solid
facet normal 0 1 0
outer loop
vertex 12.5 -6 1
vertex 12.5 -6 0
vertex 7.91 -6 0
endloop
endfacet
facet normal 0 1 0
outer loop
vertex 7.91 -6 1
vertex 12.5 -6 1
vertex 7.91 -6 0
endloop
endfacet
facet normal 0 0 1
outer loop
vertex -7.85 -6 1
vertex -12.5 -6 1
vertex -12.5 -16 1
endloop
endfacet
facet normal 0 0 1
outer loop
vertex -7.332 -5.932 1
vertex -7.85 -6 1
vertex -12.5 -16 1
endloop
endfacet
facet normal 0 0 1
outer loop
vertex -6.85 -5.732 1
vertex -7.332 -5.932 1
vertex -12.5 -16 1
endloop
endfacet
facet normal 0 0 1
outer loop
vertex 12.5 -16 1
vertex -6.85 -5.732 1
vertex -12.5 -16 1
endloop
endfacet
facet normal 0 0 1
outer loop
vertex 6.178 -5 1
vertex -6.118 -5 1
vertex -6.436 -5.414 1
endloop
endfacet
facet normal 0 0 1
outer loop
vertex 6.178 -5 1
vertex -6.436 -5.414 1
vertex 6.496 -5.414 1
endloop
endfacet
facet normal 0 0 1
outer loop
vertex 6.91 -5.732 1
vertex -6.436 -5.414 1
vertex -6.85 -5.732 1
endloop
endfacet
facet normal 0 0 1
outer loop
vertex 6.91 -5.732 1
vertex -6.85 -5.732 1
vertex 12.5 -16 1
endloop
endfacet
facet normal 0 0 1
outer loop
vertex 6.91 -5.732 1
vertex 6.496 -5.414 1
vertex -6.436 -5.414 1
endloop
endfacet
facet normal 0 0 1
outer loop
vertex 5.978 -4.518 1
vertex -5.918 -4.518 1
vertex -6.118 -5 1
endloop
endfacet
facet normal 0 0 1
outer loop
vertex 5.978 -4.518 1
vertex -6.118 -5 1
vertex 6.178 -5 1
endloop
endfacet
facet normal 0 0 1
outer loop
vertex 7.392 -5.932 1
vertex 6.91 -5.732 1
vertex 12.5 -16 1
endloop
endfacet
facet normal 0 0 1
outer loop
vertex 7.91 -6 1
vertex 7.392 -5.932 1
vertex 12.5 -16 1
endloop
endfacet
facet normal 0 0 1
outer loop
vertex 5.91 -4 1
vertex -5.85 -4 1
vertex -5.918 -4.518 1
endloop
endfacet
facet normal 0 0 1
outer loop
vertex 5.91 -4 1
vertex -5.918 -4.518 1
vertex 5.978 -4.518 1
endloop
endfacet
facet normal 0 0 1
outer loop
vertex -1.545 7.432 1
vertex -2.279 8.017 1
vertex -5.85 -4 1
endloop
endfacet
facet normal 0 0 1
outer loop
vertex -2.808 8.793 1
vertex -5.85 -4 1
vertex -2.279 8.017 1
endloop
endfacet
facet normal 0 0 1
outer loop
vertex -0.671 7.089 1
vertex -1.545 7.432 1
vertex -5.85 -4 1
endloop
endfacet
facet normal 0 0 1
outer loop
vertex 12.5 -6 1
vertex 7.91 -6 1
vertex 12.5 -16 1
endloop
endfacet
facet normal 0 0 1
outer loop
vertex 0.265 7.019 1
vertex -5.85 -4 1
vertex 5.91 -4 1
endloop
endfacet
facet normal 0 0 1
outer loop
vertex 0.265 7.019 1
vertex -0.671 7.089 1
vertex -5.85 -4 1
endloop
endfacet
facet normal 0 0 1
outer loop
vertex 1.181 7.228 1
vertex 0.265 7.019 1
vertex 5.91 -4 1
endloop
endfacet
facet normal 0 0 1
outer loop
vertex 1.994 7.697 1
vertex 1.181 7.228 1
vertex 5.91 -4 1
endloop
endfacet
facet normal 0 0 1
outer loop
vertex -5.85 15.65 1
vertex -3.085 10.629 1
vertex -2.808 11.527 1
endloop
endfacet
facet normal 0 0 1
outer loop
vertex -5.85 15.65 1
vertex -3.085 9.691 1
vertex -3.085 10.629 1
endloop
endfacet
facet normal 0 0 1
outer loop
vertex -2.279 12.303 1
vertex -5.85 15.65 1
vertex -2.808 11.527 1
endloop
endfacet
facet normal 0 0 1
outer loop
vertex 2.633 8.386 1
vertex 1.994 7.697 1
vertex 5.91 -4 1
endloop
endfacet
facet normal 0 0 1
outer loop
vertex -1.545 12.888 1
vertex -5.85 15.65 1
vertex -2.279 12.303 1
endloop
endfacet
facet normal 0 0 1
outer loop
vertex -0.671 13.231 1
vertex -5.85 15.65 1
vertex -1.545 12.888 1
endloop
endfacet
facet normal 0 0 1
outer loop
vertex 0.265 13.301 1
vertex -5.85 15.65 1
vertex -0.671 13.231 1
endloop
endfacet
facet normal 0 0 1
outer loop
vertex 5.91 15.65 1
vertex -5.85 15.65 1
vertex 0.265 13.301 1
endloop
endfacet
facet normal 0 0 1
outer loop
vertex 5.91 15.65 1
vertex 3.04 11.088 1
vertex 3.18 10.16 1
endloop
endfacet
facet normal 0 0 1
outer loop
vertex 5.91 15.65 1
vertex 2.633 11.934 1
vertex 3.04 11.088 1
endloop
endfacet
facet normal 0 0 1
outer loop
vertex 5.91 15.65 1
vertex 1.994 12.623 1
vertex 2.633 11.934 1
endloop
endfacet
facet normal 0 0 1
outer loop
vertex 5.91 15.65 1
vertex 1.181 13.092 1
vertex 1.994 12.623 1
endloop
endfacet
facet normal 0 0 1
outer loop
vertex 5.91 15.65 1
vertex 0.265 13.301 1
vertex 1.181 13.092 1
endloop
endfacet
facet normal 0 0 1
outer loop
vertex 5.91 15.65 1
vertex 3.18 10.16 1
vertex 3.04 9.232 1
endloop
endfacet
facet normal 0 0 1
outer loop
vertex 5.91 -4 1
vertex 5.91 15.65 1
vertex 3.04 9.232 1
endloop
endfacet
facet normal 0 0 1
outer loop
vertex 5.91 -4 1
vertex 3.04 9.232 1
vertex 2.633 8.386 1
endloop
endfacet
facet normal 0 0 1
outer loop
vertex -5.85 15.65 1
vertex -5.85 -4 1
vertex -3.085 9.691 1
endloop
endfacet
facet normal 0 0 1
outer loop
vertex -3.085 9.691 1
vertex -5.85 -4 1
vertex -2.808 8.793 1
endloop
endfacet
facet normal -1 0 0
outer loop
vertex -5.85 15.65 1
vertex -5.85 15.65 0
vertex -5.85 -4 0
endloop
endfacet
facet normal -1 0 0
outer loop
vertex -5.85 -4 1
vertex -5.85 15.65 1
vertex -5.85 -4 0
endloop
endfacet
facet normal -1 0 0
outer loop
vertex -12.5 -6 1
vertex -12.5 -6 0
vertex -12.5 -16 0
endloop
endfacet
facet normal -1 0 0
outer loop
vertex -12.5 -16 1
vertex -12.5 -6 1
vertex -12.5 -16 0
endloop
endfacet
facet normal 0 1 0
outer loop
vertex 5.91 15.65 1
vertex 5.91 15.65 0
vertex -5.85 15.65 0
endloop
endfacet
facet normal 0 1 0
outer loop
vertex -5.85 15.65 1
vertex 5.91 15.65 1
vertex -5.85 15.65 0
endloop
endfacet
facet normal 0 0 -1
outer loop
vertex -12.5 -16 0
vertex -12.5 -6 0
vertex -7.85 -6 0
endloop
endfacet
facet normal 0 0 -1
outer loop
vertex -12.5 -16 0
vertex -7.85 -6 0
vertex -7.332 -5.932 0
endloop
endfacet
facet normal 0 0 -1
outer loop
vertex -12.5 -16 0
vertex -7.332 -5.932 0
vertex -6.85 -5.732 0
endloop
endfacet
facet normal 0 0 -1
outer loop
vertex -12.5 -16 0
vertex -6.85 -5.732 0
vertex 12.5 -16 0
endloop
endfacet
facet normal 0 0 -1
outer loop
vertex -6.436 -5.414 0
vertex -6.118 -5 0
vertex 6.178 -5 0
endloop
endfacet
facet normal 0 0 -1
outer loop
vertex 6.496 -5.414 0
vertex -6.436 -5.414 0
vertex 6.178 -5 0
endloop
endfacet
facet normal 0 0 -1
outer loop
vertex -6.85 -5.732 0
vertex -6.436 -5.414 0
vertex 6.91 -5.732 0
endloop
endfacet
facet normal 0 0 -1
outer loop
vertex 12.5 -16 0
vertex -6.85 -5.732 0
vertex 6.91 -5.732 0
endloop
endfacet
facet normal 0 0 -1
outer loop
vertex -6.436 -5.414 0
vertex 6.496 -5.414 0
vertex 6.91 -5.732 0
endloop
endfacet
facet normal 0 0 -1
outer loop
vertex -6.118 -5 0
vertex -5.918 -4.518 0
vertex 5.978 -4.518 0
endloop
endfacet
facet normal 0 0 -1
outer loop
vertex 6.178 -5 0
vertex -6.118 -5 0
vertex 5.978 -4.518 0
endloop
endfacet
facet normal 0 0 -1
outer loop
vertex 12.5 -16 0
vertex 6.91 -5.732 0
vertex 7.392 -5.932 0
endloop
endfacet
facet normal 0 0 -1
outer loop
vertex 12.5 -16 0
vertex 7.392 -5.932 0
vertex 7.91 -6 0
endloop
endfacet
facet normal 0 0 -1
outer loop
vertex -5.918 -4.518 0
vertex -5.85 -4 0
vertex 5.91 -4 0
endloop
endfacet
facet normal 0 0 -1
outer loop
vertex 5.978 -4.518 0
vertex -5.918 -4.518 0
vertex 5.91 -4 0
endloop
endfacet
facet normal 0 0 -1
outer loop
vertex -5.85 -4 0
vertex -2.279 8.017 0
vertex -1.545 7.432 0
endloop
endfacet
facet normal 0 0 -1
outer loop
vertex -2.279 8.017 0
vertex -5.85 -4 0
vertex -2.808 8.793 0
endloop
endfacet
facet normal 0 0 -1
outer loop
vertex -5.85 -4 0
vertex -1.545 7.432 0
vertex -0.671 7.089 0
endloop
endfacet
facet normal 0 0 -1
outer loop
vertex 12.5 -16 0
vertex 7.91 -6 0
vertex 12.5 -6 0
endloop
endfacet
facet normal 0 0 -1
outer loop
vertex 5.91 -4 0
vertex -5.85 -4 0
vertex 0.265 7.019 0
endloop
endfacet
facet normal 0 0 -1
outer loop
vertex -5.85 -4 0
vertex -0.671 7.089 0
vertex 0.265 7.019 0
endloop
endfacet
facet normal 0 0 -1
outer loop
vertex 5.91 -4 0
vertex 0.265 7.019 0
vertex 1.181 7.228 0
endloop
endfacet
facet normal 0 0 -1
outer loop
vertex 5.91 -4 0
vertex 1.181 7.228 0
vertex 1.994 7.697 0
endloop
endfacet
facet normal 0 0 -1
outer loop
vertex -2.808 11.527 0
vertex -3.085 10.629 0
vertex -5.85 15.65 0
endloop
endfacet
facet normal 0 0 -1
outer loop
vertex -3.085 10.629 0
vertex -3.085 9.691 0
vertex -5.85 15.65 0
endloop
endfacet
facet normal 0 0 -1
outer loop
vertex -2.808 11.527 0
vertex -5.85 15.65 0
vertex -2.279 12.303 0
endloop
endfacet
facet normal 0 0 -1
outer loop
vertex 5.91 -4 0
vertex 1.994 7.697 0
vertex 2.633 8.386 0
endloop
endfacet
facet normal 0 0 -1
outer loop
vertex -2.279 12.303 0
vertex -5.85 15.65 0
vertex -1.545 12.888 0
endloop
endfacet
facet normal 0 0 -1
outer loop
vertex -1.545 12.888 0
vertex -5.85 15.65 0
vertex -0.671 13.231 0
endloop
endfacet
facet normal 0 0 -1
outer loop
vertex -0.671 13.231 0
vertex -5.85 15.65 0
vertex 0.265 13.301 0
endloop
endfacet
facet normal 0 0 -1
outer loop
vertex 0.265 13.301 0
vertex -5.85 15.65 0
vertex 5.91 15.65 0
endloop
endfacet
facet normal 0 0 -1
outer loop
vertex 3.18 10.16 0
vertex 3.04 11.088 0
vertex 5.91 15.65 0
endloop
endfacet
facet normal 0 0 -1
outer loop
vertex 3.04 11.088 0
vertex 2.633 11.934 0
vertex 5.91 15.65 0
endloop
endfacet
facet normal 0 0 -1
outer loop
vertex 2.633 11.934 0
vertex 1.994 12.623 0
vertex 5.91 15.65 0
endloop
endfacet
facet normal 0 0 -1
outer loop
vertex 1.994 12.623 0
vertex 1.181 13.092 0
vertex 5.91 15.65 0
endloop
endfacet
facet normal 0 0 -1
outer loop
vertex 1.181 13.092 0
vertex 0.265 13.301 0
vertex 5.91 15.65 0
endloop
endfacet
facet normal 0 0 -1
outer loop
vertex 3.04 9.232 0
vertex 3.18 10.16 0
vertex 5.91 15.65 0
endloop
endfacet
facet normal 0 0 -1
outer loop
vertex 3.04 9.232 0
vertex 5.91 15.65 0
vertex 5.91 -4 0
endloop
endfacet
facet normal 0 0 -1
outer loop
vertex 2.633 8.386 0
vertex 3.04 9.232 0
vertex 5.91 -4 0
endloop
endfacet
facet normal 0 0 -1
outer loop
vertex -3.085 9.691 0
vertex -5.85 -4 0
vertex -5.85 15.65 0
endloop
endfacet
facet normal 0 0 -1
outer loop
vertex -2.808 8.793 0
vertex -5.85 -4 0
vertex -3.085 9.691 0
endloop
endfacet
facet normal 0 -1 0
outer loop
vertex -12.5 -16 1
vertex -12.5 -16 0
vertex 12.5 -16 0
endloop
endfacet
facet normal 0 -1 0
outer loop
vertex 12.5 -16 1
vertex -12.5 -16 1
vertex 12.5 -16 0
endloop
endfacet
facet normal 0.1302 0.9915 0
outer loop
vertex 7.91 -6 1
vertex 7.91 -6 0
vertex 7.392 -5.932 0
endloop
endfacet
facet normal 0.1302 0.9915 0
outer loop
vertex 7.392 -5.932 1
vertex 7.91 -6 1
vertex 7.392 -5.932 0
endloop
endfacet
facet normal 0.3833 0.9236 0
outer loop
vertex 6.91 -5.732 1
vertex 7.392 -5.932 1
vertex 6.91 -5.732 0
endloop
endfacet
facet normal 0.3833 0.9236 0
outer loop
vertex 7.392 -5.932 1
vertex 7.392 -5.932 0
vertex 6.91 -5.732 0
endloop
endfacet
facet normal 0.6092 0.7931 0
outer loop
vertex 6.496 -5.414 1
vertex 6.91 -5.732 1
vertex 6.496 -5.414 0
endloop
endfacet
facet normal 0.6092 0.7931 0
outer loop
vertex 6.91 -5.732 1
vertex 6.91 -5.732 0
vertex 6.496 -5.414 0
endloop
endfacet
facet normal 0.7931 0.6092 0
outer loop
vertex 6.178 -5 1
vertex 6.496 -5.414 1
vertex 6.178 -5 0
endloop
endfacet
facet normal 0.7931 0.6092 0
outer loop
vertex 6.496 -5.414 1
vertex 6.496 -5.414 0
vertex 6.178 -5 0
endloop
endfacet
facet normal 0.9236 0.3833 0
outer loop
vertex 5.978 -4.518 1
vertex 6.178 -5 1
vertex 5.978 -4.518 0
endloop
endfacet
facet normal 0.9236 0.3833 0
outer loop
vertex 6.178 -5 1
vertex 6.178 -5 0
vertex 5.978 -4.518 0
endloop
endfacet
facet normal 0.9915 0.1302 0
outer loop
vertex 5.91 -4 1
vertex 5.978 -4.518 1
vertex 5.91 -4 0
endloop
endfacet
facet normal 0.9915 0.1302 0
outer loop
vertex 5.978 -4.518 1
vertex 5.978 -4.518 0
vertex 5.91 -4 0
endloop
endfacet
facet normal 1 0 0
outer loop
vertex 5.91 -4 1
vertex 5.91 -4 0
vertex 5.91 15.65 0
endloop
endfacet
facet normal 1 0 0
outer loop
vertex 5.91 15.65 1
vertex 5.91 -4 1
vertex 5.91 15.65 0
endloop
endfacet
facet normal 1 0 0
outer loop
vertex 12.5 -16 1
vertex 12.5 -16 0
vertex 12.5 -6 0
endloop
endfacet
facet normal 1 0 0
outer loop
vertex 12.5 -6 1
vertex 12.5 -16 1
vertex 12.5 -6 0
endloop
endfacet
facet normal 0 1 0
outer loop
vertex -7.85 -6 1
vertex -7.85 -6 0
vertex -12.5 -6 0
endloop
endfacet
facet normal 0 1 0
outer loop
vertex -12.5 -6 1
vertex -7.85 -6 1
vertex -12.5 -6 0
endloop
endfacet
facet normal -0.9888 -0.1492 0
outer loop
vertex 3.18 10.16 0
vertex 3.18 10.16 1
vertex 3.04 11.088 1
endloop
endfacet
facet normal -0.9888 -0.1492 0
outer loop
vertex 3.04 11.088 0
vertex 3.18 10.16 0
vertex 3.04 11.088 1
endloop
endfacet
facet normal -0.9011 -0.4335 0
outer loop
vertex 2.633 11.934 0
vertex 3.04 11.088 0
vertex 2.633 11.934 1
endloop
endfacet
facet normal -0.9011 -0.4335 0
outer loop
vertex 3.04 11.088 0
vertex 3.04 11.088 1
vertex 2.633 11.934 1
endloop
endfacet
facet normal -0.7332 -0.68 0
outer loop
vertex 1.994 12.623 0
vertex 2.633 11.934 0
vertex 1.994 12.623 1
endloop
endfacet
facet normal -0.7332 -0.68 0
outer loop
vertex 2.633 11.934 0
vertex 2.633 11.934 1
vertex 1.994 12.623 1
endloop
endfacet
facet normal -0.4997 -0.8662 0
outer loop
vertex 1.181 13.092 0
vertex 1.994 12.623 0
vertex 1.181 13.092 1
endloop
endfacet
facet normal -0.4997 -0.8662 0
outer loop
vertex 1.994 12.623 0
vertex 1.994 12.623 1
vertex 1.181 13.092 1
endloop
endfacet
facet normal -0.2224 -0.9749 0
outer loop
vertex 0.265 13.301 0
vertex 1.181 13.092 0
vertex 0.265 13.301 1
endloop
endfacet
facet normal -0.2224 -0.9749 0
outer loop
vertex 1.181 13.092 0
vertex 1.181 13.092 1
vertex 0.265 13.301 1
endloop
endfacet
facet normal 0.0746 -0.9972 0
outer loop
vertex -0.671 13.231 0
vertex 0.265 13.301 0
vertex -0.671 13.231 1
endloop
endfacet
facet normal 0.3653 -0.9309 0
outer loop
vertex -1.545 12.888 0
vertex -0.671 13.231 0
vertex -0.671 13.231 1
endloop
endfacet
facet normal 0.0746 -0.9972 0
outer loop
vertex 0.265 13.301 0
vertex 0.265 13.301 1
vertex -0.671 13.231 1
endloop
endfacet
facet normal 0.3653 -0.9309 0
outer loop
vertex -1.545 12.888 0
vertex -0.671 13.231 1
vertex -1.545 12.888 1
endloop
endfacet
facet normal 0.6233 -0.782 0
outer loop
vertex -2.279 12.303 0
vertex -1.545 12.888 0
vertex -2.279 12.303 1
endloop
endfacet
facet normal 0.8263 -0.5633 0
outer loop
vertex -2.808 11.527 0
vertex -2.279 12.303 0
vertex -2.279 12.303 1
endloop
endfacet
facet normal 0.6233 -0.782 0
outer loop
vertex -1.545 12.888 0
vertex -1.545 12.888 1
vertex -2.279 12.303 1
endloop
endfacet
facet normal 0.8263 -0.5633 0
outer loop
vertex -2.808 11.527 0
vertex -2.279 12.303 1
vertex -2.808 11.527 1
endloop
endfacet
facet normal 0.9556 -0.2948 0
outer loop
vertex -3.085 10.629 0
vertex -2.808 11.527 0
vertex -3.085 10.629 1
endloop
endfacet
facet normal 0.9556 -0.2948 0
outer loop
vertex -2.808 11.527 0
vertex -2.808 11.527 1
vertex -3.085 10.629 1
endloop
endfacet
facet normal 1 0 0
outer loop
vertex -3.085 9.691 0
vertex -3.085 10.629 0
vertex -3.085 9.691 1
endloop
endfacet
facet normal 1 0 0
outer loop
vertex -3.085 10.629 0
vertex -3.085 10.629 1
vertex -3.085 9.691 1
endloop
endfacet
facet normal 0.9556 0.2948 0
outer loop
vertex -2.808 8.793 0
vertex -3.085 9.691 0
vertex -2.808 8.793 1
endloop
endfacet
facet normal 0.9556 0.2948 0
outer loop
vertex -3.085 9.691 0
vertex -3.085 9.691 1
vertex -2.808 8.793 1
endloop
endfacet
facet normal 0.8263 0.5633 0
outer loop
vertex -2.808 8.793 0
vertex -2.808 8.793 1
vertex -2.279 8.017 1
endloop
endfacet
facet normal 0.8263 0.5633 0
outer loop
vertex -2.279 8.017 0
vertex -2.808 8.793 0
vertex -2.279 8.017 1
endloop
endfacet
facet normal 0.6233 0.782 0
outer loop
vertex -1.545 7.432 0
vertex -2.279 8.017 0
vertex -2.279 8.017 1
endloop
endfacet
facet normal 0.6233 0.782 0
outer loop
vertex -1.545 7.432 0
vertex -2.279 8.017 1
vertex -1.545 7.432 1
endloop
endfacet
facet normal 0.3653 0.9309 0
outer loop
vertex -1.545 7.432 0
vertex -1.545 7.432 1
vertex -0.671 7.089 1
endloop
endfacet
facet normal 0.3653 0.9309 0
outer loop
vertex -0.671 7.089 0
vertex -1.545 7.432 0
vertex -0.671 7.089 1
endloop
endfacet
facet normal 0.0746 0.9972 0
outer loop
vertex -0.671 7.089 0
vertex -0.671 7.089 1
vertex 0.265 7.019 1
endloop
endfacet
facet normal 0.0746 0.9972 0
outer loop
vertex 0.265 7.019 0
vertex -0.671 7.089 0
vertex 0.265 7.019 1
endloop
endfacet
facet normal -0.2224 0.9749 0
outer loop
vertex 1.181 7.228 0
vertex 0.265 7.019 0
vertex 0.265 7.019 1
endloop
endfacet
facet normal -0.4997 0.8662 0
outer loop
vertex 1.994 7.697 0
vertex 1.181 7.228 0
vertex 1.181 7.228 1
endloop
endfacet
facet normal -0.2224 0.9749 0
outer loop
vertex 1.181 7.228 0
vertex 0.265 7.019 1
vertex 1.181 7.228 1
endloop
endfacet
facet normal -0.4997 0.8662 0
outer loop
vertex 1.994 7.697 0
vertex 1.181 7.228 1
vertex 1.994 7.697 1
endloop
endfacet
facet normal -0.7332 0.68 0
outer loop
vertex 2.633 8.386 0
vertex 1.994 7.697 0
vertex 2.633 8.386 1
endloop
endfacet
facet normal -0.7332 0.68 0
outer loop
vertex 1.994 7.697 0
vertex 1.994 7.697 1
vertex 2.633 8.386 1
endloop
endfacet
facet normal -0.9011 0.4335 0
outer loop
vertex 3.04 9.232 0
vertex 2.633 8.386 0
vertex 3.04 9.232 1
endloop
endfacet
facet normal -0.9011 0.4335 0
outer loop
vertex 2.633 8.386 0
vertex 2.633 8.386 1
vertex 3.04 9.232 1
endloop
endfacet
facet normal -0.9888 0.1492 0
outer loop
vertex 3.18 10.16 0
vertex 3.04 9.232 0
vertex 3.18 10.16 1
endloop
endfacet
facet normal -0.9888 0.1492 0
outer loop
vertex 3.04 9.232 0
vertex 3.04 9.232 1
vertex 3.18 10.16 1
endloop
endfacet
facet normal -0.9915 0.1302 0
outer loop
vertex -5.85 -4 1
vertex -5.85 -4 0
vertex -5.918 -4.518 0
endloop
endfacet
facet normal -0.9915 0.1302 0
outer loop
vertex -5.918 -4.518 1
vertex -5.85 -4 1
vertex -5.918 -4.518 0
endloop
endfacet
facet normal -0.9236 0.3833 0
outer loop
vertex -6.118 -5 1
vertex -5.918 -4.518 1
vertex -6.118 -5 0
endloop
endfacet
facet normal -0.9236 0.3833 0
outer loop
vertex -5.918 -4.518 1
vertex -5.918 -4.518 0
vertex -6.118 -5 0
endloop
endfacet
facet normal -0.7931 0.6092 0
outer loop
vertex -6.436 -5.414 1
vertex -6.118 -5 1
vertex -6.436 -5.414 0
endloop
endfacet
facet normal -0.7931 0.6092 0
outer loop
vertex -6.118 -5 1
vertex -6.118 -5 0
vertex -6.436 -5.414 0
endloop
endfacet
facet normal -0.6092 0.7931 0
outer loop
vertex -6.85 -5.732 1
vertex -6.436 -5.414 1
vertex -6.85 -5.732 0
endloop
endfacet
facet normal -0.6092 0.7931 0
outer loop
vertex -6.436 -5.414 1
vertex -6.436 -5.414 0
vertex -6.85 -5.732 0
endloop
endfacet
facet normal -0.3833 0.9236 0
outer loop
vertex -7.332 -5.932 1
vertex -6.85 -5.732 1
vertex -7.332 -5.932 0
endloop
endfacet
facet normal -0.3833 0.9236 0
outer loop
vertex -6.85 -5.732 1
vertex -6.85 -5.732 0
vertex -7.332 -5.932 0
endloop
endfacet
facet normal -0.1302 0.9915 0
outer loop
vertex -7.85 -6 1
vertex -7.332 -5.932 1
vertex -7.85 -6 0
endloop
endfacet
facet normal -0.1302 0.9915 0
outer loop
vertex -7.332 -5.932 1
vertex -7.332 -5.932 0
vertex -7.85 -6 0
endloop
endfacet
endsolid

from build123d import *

# Parameters (mm, degrees)
DODANIE_WYCI_GNI_CIE1_DEPTH = 1
SZKIC2_R                    = 3.15
WYTNIJ_WYCI_GNI_CIE1_DEPTH  = 1


with BuildPart() as part:
    # Szkic1 → Dodanie-wyciągnięcie1 (new body)
    with BuildSketch(Plane.XY):
        with BuildLine():
            Line((-12.5, -6), (-12.5, -16))
            Line((-12.5, -16), (12.5, -16))
            Line((12.5, -16), (12.5, -6))
            Line((12.5, -6), (7.91, -6))
            ThreePointArc((7.91, -6), (6.495786438, -5.414213562), (5.91, -4))
            Line((5.91, -4), (5.91, 15.65))
            Line((5.91, 15.65), (-5.85, 15.65))
            Line((-5.85, 15.65), (-5.85, -4))
            ThreePointArc((-5.85, -4), (-6.435786438, -5.414213562), (-7.85, -6))
            Line((-7.85, -6), (-12.5, -6))
        make_face()
    extrude(amount=DODANIE_WYCI_GNI_CIE1_DEPTH)

    # Szkic2 → Wytnij-wyciągnięcie1 (cut)
    with BuildSketch(Plane.XY.offset(1)):
        with Locations((0.03, 10.16)):
            Circle(SZKIC2_R)
    extrude(amount=-WYTNIJ_WYCI_GNI_CIE1_DEPTH, mode=Mode.SUBTRACT)


solid = part.part
